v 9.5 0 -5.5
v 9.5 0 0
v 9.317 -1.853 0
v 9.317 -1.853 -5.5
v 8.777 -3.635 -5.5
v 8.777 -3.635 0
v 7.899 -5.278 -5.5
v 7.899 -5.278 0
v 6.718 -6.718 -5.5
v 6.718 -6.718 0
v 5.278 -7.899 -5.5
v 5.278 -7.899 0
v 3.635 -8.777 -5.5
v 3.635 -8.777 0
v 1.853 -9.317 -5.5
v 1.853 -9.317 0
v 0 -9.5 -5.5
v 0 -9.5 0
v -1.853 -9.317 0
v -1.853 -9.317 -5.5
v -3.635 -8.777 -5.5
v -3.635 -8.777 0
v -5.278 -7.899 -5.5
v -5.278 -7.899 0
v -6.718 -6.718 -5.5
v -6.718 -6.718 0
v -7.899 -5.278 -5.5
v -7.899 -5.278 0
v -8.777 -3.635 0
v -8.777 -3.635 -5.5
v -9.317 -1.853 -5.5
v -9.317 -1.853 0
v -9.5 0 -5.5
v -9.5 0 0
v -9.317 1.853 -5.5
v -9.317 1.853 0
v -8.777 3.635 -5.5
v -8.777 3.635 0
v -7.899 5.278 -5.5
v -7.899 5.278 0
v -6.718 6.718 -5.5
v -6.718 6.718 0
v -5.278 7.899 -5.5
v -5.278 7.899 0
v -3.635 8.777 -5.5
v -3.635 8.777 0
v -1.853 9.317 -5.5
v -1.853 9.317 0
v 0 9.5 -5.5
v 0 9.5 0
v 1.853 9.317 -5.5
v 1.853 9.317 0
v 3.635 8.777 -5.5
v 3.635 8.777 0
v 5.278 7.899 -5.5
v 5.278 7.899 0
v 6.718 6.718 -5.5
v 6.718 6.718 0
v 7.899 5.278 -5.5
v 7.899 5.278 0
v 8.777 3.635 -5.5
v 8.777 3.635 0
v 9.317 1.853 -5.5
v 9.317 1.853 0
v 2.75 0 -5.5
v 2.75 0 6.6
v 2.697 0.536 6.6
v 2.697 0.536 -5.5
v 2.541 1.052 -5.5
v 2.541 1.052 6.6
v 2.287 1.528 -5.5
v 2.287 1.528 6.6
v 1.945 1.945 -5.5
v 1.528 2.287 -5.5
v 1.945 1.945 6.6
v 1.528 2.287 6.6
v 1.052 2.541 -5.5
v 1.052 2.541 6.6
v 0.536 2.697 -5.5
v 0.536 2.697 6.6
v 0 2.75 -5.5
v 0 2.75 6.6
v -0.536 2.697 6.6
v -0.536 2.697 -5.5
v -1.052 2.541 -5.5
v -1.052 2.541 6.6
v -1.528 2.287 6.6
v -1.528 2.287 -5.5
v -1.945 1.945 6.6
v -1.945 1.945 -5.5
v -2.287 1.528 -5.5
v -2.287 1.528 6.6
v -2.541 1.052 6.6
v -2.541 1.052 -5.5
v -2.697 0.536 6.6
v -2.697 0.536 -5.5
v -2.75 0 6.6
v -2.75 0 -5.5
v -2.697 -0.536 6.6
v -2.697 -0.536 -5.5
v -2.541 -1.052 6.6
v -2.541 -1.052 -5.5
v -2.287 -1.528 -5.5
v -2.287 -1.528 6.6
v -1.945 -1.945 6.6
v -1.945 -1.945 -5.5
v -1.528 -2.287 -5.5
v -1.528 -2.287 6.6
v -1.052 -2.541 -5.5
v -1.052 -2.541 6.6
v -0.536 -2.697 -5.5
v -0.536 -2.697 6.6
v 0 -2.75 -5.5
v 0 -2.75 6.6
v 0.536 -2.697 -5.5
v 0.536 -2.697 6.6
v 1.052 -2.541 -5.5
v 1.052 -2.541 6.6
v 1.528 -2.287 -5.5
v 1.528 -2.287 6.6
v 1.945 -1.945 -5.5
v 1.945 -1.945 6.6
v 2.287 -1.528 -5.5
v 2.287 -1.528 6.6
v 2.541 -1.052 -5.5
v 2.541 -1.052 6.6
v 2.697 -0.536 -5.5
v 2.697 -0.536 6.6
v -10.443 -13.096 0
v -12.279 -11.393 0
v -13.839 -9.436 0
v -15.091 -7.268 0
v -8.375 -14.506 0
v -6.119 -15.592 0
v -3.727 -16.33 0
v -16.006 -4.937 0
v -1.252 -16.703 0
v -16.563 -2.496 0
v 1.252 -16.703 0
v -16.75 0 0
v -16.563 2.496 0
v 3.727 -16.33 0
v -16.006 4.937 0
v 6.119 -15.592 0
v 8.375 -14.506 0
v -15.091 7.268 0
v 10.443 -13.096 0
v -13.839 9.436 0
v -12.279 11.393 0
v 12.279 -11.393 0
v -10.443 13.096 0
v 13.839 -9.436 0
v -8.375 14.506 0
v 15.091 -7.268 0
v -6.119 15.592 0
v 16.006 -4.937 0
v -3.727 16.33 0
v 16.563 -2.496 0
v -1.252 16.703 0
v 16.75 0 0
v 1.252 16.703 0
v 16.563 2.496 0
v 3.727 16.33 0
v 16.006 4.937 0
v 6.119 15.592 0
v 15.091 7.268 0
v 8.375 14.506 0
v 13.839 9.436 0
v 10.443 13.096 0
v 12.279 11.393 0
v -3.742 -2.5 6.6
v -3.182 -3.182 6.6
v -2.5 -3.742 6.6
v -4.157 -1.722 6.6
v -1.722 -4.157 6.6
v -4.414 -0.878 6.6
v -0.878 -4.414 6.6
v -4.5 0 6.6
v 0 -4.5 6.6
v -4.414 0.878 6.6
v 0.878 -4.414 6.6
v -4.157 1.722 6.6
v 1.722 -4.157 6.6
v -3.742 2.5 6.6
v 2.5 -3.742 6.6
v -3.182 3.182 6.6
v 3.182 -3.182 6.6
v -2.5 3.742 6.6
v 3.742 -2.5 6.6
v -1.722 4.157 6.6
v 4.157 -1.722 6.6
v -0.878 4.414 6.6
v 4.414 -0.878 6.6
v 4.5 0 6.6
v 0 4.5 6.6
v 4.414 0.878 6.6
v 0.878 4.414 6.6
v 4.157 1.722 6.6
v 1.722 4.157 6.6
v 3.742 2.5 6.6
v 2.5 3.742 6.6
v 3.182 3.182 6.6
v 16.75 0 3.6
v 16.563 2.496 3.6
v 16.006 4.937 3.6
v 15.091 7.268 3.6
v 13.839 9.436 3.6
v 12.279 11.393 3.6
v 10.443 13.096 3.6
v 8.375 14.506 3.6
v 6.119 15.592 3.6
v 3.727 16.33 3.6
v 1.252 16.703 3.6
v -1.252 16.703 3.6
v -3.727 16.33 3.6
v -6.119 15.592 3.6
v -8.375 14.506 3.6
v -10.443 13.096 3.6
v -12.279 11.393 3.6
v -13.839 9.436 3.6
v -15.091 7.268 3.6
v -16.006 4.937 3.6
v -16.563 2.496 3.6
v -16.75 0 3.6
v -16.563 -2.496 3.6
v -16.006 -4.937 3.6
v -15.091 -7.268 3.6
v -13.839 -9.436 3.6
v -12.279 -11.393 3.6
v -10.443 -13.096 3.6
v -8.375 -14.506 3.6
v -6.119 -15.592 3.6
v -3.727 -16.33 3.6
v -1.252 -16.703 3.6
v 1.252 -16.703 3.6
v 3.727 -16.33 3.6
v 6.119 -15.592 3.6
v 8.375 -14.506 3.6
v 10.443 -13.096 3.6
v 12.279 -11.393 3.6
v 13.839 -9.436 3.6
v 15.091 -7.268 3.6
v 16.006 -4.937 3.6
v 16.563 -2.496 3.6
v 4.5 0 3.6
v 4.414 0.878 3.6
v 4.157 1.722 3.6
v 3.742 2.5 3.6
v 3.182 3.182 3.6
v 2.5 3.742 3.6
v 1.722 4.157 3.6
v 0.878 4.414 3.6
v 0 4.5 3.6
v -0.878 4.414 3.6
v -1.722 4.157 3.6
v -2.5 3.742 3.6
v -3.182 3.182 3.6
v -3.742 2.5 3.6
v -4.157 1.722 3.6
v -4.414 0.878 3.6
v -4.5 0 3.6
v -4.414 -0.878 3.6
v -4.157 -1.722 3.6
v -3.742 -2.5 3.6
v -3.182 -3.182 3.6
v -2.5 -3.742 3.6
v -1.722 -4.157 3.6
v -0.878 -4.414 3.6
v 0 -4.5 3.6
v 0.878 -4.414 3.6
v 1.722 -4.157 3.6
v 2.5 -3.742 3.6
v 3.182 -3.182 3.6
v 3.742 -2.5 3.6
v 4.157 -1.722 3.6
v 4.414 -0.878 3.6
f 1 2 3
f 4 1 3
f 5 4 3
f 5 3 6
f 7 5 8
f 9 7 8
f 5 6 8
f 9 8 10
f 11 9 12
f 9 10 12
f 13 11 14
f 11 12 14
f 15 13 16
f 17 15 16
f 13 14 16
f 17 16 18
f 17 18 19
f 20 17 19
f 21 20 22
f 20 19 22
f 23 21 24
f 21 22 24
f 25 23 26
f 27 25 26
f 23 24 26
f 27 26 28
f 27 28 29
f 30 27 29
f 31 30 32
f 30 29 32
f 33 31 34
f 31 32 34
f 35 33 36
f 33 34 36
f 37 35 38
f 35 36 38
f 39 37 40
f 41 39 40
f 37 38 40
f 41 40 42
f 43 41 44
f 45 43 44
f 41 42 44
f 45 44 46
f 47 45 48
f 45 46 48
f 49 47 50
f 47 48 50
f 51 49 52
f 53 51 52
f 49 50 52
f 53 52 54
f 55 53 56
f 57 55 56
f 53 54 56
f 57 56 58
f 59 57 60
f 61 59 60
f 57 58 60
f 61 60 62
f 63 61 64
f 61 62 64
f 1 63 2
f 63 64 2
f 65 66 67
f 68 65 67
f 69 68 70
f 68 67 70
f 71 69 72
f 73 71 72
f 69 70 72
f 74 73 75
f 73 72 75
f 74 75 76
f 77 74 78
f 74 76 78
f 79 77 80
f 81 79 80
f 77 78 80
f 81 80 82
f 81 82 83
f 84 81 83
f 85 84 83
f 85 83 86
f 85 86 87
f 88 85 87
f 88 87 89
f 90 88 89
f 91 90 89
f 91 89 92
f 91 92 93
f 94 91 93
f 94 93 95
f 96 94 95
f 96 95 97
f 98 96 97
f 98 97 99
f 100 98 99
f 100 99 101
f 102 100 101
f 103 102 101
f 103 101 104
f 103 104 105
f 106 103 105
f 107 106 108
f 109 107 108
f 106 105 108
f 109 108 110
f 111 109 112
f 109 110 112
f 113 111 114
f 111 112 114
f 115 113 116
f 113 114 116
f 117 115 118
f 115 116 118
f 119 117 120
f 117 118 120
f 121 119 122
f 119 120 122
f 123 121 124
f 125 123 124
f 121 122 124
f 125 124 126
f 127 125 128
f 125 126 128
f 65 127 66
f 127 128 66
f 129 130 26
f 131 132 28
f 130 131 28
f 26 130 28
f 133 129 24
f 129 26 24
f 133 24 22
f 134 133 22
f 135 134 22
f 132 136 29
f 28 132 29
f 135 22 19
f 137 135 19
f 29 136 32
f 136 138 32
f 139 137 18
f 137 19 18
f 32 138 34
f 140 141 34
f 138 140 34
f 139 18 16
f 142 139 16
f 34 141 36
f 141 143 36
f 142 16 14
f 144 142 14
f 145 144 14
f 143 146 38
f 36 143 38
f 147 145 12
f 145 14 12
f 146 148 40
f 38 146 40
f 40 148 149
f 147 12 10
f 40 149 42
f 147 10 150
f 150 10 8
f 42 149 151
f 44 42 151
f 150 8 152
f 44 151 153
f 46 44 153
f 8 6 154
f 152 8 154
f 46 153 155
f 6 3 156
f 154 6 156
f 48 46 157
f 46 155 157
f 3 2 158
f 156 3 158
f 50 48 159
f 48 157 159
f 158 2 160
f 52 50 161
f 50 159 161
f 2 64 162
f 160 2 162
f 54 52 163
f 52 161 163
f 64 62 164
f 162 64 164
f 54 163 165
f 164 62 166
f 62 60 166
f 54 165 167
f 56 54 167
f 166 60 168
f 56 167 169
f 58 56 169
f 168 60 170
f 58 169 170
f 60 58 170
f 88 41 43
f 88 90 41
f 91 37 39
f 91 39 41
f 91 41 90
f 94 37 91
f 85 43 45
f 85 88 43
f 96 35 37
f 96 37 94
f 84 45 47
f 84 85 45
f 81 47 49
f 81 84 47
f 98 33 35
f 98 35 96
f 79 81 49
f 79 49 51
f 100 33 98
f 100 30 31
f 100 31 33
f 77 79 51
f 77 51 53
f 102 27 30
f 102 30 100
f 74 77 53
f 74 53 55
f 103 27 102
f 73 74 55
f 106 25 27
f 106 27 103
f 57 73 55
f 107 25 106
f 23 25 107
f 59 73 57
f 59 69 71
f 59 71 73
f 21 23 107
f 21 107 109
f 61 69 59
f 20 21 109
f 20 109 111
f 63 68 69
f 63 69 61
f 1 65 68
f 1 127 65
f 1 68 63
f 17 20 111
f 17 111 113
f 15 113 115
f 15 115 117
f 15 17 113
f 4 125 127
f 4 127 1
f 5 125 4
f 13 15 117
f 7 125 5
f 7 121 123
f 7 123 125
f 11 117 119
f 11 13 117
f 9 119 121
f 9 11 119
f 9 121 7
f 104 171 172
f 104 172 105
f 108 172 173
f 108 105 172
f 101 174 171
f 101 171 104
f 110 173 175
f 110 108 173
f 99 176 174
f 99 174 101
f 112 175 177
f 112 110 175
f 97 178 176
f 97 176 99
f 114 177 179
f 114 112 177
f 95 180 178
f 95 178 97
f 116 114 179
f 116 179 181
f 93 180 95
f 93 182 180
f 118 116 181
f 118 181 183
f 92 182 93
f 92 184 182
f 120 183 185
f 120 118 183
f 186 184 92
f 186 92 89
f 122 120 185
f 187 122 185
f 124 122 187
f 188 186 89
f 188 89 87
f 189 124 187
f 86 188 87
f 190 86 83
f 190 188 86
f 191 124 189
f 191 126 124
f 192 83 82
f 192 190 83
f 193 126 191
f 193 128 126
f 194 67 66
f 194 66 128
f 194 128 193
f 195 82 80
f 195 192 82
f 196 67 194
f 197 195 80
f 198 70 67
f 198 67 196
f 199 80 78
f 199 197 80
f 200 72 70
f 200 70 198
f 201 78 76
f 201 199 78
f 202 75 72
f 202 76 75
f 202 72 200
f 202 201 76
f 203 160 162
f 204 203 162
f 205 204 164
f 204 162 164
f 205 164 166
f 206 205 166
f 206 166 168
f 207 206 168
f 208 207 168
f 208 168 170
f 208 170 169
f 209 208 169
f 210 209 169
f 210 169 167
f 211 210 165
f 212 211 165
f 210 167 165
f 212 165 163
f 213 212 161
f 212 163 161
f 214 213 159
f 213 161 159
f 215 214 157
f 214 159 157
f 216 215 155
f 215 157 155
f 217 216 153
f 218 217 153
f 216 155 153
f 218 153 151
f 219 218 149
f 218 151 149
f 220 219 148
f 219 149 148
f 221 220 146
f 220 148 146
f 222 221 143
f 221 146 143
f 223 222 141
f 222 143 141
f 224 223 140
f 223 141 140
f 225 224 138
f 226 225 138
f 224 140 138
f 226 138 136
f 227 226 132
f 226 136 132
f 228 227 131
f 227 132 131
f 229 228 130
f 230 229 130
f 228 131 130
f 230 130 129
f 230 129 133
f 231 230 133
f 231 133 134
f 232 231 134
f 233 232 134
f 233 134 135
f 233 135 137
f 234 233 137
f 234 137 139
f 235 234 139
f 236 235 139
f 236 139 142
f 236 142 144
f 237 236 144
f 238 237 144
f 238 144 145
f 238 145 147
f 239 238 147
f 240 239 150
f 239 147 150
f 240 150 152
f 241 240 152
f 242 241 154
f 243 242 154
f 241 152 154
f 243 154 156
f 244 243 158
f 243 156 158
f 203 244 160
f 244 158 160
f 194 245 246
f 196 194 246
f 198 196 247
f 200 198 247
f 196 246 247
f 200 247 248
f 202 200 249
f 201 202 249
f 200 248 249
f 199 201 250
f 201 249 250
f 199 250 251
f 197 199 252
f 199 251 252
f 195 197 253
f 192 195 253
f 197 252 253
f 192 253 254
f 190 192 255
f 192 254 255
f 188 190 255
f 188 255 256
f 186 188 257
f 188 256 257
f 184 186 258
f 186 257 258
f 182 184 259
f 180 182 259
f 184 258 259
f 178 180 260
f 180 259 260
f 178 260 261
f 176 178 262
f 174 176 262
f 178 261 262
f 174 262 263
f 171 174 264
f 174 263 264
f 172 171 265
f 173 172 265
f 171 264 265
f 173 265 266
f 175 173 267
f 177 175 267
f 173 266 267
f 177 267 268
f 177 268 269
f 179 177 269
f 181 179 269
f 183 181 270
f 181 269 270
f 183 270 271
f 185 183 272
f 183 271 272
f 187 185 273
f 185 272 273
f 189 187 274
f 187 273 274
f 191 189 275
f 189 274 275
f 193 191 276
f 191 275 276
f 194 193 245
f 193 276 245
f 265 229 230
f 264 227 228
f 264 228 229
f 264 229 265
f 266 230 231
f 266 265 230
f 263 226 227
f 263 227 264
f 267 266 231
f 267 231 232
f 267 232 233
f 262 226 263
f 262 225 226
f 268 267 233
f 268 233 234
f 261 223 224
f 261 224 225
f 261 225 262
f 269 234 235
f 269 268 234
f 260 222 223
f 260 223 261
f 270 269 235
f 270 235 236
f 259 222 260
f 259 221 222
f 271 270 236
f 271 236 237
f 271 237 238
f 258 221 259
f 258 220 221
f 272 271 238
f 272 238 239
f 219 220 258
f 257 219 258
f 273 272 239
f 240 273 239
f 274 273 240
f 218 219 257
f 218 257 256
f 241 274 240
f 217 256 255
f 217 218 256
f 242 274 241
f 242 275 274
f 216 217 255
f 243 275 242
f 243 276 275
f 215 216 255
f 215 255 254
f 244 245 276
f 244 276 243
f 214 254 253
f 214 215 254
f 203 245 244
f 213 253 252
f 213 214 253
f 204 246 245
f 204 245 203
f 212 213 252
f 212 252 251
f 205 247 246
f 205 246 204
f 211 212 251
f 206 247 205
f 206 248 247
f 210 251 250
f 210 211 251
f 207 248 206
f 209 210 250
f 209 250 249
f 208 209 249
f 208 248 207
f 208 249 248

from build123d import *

# Parameters (mm, degrees)
SKETCH_R     = 16.75
PAD_DEPTH    = 3.6
SKETCH003_R  = 9.5
PAD002_DEPTH = 5.5
SKETCH001_R  = 4.5
PAD001_DEPTH = 3
SKETCH002_R  = 2.75
POCKET_DEPTH = 12.101


with BuildPart() as part:
    # Sketch → Pad (new body)
    with BuildSketch(Plane.XY):
        Circle(SKETCH_R)
    extrude(amount=PAD_DEPTH)

    # Sketch003 (on Face2 of Pocket) → Pad002 (join)
    with BuildSketch(Plane(origin=(0, 0, 0), x_dir=(1, 0, 0), z_dir=(0, 0, -1))):
        Circle(SKETCH003_R)
    extrude(amount=PAD002_DEPTH)

    # Sketch001 (on Face3 of Pad) → Pad001 (join)
    with BuildSketch(Plane.XY.offset(3.6)):
        Circle(SKETCH001_R)
    extrude(amount=PAD001_DEPTH)

    # Sketch002 (on Face5 of Pad001) → Pocket (cut, through all)
    with BuildSketch(Plane.XY.offset(6.6)):
        Circle(SKETCH002_R)
    extrude(amount=-POCKET_DEPTH, mode=Mode.SUBTRACT)


solid = part.part
